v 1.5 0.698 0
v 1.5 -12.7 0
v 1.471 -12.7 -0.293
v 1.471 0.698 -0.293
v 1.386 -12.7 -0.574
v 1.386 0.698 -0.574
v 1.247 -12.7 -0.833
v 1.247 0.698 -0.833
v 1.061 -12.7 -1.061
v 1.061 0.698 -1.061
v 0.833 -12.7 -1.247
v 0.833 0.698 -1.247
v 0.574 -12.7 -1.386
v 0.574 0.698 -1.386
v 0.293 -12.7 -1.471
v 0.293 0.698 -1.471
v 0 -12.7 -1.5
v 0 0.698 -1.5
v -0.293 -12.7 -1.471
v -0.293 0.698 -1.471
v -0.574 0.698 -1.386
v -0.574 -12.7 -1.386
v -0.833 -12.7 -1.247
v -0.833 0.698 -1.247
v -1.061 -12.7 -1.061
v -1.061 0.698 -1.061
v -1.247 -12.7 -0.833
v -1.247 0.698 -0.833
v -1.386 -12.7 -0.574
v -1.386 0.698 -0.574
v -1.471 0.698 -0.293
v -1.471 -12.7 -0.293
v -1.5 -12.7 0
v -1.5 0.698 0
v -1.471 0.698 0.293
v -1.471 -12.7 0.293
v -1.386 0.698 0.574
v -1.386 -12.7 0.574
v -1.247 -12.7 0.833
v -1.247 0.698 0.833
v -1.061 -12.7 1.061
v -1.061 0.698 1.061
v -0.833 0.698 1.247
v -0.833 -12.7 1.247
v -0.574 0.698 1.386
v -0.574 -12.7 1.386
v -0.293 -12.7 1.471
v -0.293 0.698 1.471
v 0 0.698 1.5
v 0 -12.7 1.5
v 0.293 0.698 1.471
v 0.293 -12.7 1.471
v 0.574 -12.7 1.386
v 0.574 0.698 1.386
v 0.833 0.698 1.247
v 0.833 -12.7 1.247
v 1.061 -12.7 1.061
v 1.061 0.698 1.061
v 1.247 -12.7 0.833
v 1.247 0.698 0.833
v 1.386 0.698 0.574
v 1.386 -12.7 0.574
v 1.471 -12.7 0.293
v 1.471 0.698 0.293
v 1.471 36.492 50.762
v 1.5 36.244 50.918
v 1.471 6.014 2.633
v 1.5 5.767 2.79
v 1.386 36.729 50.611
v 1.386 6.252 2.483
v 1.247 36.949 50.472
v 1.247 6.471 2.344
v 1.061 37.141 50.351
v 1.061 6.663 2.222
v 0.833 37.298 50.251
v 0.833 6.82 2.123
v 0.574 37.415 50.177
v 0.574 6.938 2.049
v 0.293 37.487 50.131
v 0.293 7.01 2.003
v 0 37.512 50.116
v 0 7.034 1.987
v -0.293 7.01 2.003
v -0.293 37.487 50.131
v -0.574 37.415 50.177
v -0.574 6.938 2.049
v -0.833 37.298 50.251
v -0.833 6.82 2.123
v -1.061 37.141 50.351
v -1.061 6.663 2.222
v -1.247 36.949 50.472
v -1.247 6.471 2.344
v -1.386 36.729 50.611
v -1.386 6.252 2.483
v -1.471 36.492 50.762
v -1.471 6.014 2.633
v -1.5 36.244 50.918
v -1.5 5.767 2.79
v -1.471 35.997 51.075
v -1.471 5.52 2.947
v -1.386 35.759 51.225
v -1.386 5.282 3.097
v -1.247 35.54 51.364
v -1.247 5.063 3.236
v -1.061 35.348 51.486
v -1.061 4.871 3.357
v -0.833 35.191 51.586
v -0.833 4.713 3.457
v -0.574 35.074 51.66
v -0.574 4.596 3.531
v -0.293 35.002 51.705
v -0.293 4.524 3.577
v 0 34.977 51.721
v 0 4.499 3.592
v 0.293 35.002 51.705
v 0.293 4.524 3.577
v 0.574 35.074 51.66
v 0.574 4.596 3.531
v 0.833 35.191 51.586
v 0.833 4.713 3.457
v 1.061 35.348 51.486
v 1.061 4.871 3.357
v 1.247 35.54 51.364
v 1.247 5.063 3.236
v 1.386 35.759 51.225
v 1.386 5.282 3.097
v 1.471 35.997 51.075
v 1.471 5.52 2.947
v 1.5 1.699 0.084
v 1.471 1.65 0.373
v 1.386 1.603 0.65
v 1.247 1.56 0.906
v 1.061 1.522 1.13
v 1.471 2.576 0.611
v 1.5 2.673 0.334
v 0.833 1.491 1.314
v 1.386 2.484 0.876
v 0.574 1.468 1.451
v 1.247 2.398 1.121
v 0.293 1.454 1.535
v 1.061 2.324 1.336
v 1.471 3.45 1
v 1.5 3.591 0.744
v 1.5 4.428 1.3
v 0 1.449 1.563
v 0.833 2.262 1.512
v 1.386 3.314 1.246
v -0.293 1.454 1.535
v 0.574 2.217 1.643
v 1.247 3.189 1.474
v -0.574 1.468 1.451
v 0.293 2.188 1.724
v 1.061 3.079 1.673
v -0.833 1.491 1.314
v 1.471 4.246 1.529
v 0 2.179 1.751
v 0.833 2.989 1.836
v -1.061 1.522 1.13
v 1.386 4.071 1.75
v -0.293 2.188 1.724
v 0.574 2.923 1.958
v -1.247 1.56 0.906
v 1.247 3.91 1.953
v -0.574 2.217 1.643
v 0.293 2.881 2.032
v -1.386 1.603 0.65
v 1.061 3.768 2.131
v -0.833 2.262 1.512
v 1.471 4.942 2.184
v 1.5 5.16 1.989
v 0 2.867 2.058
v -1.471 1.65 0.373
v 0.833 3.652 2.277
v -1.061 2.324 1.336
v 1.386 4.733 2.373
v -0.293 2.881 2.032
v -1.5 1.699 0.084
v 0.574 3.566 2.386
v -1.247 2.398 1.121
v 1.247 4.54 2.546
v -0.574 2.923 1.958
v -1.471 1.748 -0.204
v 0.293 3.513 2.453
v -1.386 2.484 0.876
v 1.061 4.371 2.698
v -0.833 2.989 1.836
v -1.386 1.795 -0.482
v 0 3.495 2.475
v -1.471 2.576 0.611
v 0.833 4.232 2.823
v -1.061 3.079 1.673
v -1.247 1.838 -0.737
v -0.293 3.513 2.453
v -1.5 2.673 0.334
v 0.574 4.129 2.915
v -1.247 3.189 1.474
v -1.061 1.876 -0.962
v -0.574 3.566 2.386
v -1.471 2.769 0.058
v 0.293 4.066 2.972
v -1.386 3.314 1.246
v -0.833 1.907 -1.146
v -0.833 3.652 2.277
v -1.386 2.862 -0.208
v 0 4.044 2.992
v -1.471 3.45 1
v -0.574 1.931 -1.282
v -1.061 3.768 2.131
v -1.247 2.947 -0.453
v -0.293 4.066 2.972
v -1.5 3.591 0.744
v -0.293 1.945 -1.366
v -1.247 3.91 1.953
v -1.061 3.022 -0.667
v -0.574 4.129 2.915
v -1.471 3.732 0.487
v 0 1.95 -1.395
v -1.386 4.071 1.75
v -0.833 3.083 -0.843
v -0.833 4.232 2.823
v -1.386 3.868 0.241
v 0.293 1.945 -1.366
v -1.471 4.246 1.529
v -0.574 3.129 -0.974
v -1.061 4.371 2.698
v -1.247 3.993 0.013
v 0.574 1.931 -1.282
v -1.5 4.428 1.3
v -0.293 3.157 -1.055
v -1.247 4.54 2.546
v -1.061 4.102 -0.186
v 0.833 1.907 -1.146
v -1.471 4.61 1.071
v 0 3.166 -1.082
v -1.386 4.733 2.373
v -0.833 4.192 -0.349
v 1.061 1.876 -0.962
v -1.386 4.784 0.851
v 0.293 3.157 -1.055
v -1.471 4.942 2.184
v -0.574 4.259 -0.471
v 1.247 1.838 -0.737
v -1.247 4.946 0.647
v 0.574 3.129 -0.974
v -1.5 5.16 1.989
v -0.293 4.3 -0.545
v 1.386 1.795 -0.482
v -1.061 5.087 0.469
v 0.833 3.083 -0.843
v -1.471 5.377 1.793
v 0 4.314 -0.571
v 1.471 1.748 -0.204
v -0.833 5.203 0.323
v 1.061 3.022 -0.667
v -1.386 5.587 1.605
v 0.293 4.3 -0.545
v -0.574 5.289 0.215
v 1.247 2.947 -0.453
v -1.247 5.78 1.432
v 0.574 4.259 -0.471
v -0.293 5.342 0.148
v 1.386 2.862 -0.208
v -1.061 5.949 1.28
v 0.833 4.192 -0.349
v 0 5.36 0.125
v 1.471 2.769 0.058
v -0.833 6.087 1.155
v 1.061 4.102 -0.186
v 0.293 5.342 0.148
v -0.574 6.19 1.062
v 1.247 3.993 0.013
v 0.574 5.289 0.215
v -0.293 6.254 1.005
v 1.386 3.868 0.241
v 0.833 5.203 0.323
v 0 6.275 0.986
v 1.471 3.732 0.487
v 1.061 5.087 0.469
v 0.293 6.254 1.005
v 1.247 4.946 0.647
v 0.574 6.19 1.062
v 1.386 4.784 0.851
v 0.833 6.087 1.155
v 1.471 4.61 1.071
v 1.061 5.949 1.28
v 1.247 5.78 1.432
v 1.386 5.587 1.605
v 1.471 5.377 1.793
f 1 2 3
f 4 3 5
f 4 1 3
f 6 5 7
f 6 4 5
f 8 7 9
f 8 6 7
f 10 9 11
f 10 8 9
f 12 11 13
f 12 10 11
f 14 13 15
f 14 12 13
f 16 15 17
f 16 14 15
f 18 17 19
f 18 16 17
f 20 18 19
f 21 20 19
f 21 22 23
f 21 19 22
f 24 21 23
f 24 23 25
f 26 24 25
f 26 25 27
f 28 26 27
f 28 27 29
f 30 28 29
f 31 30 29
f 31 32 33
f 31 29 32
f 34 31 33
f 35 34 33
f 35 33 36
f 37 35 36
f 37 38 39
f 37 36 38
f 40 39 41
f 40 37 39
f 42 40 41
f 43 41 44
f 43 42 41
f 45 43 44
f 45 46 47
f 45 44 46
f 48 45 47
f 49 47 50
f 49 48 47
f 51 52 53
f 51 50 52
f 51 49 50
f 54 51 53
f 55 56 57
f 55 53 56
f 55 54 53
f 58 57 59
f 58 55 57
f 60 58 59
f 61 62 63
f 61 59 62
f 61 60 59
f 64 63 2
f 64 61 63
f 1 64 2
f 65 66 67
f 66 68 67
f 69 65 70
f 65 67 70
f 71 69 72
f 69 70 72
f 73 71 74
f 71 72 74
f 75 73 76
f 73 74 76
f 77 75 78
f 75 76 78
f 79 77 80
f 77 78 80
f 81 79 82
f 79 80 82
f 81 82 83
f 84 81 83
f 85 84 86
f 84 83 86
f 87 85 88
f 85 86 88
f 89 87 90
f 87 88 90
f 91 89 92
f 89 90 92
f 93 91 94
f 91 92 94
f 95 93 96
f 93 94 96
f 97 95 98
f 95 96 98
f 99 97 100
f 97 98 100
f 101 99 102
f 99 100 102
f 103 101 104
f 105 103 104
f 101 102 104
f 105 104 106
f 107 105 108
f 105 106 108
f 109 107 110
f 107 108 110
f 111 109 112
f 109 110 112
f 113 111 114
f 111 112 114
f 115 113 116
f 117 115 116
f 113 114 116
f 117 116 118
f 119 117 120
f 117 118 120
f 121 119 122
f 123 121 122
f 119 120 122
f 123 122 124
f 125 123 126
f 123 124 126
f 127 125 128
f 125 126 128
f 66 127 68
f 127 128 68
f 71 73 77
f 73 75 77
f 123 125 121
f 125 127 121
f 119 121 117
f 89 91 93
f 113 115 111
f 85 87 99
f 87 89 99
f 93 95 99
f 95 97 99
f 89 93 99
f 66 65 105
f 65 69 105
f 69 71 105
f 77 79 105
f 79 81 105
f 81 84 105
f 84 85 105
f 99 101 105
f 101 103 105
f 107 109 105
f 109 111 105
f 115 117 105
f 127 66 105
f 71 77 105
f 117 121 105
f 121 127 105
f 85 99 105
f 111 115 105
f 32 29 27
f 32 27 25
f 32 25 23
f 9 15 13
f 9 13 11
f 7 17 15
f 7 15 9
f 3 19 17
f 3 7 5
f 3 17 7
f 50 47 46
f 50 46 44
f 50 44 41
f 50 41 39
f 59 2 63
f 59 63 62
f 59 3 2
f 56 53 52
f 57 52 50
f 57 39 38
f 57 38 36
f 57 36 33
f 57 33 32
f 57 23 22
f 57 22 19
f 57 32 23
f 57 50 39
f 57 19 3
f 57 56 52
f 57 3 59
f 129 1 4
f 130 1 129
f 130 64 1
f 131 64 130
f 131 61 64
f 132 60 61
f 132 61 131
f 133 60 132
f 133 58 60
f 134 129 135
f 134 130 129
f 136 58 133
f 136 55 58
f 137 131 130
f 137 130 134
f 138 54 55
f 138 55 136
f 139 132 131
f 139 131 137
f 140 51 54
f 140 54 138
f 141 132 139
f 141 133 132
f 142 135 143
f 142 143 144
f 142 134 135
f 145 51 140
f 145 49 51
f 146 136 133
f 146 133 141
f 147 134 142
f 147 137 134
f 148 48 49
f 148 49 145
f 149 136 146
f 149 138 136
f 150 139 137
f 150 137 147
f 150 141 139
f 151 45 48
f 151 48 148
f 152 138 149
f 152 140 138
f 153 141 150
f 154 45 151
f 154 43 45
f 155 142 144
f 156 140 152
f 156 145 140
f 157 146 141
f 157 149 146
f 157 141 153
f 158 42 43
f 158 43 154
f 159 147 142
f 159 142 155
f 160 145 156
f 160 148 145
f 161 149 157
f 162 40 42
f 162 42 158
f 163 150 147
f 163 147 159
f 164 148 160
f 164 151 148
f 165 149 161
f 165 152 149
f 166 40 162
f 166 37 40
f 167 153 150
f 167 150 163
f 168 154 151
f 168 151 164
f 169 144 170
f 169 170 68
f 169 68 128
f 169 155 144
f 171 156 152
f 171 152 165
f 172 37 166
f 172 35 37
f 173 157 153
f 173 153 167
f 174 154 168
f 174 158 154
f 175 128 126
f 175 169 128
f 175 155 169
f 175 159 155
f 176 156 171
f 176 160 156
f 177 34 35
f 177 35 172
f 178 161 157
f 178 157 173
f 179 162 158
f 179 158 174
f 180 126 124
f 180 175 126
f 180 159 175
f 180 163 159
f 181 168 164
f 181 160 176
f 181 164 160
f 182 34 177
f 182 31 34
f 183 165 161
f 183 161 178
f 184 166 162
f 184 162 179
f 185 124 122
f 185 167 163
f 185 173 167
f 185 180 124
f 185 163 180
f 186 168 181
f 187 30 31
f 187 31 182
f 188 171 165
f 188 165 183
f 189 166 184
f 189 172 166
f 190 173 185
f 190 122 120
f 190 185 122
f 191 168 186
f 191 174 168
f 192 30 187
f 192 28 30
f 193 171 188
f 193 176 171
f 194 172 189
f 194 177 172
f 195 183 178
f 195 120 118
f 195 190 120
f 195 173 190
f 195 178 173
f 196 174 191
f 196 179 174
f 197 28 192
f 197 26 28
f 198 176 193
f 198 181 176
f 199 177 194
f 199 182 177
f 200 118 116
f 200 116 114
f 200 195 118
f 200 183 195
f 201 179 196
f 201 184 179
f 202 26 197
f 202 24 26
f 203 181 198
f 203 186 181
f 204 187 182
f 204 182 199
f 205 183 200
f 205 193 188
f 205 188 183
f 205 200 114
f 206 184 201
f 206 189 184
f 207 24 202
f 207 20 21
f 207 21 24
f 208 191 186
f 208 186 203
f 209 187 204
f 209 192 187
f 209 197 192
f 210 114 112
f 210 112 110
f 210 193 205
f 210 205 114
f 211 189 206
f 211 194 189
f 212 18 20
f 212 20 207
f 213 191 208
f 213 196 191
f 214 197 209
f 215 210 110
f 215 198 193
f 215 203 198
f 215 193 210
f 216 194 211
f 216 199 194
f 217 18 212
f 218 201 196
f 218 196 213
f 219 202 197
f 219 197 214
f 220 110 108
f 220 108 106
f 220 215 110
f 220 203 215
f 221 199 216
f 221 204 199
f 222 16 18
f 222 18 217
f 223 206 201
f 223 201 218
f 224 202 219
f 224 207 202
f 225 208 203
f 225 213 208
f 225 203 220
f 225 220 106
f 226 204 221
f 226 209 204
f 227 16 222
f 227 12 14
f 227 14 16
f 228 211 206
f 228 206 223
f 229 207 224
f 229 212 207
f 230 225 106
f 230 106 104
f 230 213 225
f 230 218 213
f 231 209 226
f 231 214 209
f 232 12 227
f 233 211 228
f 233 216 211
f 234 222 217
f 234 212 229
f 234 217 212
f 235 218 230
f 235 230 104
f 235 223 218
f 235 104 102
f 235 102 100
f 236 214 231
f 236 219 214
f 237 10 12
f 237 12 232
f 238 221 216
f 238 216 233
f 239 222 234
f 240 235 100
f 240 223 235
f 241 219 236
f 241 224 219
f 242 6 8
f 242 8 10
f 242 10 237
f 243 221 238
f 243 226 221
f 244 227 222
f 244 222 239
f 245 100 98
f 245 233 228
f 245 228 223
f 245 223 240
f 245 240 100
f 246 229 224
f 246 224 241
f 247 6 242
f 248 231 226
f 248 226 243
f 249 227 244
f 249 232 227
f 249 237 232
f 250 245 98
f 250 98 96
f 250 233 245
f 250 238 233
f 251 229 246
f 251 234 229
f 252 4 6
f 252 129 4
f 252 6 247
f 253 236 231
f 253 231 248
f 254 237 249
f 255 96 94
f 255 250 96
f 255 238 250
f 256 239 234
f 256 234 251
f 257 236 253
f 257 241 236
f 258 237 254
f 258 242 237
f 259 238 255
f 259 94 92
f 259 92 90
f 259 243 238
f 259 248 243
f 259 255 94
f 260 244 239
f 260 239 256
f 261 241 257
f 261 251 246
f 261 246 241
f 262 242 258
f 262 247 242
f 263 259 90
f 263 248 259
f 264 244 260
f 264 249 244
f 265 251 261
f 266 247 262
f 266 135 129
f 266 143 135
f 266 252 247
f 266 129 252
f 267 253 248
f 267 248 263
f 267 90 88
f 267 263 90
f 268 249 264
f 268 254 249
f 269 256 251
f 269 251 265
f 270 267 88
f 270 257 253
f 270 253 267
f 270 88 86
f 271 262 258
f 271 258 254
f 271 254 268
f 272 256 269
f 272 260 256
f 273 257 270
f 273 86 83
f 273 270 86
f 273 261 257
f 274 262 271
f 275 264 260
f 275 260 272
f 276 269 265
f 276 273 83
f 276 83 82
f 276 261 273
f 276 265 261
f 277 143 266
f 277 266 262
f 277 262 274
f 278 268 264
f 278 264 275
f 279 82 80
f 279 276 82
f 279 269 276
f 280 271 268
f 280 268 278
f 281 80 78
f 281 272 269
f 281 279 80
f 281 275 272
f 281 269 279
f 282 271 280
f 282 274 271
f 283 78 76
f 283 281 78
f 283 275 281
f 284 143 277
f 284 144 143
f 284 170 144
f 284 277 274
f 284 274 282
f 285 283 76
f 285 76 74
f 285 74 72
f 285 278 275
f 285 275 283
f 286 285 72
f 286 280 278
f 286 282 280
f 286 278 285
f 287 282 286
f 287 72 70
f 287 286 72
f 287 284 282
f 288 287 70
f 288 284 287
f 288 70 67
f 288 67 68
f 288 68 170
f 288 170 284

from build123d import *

# Parameters (mm, degrees)
F0_R     = 1.5
F3_DEPTH = 12.7
F4_DEPTH = 50.8


with BuildPart() as f2:
    # F2: sweep along a path in F1
    with BuildLine(Plane.YZ) as f2_path:
        Line((0, 0), (0.6976816626, 0))
        ThreePointArc((0.6976816626, 0), (3.5907533681, 0.7435624129), (5.7667652809, 2.7899546311))
        Line((5.7667652809, 2.7899546311), (9.0660760179, 8))
    # F0 (on Front) → F2 (sweep)
    with BuildSketch(Plane.XZ):
        Circle(F0_R)
    sweep(path=f2_path.line)

    # F0 (on Front) → F3 (join)
    with BuildSketch(Plane.XZ):
        Circle(F0_R)
    extrude(amount=F3_DEPTH)

    # F4 (add): a face of the model
    f4_faces = [f2.faces().sort_by_distance(p)[0] for p in [
        (0, 9.0660760179, 8),
    ]]
    extrude(f4_faces, amount=F4_DEPTH)


solid = f2.part
